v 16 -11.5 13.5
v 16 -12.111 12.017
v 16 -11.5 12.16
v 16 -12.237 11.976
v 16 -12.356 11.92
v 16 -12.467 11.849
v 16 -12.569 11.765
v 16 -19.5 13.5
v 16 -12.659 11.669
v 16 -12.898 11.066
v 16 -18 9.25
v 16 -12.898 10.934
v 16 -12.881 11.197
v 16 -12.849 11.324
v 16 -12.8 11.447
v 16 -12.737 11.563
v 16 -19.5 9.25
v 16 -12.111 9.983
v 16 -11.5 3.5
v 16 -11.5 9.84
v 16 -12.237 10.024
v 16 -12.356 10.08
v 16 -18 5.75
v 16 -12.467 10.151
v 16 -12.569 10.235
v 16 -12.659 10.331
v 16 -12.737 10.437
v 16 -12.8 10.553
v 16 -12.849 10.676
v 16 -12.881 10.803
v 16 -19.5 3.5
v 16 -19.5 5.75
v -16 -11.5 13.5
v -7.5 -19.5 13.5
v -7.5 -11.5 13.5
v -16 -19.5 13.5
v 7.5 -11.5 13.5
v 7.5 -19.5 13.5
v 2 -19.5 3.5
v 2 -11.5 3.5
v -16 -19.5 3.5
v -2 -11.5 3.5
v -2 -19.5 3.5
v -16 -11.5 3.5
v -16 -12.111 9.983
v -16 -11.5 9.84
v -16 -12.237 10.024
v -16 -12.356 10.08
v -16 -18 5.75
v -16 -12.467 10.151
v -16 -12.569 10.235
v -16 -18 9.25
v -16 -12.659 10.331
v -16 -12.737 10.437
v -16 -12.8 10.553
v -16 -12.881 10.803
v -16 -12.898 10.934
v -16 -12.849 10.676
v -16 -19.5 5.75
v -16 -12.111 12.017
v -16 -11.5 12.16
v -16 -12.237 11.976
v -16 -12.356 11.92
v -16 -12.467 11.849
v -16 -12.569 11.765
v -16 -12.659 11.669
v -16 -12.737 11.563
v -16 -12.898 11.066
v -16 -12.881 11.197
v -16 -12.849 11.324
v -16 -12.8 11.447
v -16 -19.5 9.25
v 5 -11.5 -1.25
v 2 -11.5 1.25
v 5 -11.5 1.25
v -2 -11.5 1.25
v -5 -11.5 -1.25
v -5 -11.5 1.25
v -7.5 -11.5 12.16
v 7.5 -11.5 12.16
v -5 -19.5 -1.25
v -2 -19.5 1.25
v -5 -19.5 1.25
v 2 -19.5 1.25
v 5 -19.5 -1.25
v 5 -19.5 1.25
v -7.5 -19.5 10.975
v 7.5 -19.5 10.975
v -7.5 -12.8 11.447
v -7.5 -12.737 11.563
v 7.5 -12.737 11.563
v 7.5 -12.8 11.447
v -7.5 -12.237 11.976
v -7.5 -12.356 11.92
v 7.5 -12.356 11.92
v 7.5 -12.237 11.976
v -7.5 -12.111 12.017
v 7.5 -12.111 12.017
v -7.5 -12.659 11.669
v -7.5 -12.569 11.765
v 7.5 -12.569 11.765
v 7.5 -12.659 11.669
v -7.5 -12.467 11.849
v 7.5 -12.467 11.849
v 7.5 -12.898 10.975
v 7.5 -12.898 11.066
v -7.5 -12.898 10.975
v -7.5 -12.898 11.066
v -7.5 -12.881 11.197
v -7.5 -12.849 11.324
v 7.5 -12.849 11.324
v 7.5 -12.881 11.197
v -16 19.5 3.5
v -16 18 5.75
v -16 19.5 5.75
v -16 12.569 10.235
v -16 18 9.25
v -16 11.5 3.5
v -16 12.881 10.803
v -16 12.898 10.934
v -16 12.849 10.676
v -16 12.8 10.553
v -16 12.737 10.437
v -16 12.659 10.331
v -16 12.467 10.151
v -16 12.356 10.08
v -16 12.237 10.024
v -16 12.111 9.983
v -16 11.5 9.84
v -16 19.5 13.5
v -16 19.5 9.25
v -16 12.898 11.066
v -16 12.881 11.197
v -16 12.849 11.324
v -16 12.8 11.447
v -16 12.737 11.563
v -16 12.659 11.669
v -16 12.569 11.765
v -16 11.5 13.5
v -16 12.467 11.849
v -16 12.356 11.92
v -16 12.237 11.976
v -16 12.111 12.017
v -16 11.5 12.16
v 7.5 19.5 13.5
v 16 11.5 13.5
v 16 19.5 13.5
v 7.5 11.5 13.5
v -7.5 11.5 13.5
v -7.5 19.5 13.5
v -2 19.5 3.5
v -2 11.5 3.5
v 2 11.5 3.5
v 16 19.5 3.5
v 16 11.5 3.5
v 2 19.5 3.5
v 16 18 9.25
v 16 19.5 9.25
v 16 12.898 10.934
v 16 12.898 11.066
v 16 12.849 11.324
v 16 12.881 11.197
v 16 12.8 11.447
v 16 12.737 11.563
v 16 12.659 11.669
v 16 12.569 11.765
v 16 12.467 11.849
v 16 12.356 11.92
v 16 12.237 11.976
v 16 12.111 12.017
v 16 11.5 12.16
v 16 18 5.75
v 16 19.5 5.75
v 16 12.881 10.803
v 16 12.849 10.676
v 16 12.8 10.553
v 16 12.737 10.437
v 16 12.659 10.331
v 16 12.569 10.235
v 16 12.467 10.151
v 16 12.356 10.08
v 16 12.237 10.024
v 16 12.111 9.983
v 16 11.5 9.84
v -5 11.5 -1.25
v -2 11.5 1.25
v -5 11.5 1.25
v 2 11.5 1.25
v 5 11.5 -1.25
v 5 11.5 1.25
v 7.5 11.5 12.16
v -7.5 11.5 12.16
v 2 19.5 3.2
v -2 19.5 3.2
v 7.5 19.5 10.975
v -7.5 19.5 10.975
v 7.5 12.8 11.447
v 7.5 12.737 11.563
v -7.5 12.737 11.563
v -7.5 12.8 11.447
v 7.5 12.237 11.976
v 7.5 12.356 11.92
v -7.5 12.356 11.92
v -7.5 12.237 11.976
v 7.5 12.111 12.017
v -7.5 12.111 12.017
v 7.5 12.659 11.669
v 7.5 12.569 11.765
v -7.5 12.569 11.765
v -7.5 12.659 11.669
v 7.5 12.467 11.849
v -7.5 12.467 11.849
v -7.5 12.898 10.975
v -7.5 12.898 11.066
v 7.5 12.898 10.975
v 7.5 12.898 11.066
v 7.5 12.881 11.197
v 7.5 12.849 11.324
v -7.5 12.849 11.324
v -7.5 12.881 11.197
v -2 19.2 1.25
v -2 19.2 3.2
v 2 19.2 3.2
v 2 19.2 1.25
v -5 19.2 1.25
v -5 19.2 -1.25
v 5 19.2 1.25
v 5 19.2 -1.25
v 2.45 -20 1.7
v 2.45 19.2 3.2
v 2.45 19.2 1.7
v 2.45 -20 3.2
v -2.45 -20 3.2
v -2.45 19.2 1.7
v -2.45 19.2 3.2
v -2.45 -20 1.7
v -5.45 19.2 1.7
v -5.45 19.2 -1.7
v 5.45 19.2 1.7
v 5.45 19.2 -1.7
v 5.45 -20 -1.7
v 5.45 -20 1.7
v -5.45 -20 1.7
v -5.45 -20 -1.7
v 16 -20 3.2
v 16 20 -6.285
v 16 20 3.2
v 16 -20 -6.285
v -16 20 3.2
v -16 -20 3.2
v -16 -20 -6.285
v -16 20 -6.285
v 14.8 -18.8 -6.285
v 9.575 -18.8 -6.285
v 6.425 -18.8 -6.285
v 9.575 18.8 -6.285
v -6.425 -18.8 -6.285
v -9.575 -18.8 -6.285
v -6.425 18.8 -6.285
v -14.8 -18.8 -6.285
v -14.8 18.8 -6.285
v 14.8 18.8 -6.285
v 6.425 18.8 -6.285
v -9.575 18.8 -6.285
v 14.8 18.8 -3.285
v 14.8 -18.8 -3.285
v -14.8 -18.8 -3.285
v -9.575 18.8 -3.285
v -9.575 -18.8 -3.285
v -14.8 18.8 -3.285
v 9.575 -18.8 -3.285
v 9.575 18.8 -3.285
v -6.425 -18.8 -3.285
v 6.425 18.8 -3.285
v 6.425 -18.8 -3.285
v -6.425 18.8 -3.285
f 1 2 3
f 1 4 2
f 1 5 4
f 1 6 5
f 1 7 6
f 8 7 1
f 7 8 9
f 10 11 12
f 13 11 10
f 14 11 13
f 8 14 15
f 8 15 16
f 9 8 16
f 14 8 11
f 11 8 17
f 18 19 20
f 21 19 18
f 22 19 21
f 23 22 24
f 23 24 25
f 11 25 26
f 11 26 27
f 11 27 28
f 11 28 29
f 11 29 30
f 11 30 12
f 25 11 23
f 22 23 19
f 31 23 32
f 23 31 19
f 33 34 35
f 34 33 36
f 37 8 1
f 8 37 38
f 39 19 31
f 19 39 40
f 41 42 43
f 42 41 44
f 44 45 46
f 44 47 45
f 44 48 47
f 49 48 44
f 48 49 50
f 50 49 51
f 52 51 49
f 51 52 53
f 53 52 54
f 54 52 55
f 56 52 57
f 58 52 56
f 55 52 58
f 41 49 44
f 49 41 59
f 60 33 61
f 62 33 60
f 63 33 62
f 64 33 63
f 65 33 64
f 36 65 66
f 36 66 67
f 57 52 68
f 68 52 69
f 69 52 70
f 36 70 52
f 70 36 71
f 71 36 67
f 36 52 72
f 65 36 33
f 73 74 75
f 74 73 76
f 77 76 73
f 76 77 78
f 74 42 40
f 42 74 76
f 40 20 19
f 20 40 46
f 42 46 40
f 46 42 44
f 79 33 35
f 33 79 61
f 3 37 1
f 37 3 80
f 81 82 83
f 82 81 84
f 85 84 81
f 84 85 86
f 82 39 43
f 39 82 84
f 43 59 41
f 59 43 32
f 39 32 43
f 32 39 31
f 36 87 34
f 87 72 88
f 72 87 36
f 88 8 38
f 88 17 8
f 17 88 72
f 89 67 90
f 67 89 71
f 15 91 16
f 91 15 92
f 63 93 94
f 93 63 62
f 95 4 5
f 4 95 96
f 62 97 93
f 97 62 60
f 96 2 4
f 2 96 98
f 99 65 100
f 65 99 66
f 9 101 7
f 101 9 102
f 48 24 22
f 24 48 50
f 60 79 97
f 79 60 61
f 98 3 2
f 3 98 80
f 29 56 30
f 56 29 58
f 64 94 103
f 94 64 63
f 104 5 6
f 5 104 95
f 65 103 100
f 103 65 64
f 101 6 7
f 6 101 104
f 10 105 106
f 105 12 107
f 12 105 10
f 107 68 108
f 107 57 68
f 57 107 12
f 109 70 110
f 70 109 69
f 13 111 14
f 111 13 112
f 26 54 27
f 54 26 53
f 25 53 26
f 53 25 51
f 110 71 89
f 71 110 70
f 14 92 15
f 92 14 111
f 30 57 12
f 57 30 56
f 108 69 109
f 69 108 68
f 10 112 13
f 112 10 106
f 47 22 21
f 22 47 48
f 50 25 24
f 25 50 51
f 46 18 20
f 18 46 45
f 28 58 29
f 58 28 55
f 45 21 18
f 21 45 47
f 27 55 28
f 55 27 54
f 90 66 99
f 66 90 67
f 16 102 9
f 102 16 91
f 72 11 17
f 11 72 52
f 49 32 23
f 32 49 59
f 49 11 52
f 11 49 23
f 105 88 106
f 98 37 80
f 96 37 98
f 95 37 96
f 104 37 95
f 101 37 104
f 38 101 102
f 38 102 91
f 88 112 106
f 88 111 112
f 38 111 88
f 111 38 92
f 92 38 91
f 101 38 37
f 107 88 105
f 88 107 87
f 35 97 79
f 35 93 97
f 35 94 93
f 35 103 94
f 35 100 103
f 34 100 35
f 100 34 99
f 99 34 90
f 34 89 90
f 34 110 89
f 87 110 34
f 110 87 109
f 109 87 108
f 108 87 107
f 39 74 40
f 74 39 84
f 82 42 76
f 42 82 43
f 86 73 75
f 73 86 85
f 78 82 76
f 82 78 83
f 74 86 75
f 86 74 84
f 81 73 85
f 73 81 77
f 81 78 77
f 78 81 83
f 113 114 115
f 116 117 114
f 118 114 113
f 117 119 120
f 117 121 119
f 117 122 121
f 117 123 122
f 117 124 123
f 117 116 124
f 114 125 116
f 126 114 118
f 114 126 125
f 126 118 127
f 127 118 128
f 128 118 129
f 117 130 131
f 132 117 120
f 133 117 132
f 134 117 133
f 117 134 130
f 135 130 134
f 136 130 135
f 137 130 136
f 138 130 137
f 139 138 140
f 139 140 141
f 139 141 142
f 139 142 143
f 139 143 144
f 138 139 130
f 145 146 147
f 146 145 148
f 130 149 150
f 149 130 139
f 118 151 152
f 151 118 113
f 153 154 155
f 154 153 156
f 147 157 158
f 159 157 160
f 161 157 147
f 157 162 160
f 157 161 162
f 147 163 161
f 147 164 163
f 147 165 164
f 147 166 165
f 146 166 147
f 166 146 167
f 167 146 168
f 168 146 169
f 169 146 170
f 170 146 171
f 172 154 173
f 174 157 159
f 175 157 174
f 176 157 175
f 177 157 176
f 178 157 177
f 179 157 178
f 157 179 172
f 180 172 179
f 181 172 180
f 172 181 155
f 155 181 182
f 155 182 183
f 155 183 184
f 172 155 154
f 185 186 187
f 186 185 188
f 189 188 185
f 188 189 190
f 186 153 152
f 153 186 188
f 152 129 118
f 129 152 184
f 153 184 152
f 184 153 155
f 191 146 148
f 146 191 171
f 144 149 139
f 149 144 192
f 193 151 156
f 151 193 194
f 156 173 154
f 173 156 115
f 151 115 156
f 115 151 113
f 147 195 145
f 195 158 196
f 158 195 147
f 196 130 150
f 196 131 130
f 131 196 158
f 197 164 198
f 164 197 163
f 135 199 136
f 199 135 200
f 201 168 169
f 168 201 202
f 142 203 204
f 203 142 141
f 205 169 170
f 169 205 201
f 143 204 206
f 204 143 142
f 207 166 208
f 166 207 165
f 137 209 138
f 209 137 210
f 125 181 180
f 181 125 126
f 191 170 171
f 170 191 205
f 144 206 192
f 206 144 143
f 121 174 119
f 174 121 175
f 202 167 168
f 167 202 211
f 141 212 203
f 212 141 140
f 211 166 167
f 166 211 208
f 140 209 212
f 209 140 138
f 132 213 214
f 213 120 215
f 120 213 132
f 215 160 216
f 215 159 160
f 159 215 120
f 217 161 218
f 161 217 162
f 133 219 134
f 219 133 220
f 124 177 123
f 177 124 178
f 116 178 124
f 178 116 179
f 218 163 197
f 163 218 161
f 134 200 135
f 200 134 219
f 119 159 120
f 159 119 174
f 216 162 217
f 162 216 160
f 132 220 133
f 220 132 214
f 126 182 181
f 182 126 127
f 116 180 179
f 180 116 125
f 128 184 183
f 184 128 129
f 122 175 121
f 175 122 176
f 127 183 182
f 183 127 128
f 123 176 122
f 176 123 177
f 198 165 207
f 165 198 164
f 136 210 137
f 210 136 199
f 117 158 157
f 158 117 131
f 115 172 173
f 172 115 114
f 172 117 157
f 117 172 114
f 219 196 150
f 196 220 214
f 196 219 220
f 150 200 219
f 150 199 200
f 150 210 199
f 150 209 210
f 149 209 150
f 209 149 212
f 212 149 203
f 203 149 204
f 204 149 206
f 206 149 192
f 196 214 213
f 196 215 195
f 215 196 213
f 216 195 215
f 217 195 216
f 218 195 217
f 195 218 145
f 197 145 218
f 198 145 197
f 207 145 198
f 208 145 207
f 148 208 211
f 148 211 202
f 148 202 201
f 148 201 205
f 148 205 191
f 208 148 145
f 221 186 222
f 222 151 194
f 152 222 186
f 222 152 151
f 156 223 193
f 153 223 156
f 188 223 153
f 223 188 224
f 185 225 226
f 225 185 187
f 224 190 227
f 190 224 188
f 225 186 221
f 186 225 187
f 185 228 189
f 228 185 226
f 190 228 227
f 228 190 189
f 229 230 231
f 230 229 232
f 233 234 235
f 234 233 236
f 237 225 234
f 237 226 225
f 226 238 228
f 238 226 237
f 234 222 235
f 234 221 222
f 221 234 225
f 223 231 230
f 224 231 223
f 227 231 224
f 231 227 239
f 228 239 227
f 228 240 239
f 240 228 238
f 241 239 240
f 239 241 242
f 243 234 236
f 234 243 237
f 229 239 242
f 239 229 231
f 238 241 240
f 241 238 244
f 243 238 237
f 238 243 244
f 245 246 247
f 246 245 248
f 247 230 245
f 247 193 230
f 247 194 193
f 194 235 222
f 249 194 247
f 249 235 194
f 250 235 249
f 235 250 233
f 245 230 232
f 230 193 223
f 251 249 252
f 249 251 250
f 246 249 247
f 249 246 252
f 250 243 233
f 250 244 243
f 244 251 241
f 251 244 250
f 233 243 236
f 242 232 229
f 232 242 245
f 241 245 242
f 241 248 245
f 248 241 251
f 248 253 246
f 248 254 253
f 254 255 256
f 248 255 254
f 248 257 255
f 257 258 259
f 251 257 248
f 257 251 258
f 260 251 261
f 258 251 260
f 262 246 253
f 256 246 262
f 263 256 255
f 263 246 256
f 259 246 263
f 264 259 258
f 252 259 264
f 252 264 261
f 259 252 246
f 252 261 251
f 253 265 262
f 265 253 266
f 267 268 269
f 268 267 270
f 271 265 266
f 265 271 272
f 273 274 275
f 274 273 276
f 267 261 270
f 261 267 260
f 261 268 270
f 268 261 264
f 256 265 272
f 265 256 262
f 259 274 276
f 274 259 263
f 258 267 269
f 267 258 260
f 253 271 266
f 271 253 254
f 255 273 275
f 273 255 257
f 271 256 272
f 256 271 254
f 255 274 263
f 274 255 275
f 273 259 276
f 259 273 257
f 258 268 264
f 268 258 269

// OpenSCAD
/*
 * Component Holder.scad
 *
 *
 * NOTES:
 *
 * There are two different parts, the Track (with LEGO compatible fittings
 * on the bottom) and the Jaws which slide in the groove of the track and 
 * are held tight using a rubber band.
 *
 * You will need to print one track and two jaws.
 *
 * The track should be printed standing on end, and the jaws should be 
 * printed face down (with the curved PCB groove) on the bed.
 *
 * INSTRUCTIONS:
 *
 * 1. In the RENDER section set beautyRender to 1 and the rest to 0
 * 
 * 2. In SETTINGS set componentX and componentY to the size of the 
 *    PCB of the component you will be using.
 *
 * 3. In SETTINGS adjust brickX and brickY to be sized appropriately 
 *    to fit the component you added in the first step.
 * 
 * 4. If needed, change slotWidth to a number above 0 to accommodate 
 *    elements that may need clearance on the jaws.
 * 
 * 5. In the RENDER section set only trackRender to 1 and then export
 *    that, and then do the same for jawRender.
 *
 * 
 * Pete Prodoehl <pete@browndoggadgets.com>
 *
 */


/* --- SETTIINGS ---------------------------------------------------------------------------- */

// set the size of the component
componentX = 34;
componentY = 26;

// adjust for the size you need to hold the component
brickX = 4;
brickY = 5;

// do not change these values
trackWidth  = brickX * 8;   // do not change
trackLength = brickY * 8;   // do not change
trackHeight = 5.5;          // do not change
trackMidX   = 4;            // do not change
trackMidZ   = 5;            // do not change
trackBotX   = 10;           // do not change
trackBotZ   = 2.5;          // do not change

// adjust if desired to change the width of the jaws
jawWidth = trackWidth;

// adjusting only affects preview of jaws if needed
jawPreviewSpace = 4.5;  // default to 4.5

// add a slot in the jaw for some components if needed
slotWidth = 15; // set to 0 for no slot

$fn=50;


/* --- RENDER ------------------------------------------------------------------------------- */


// toggle these to affect the preview and rendering
trackRender  = 0;
jawRender    = 0;
beautyRender = 1;



// render commands
if (jawRender) {
	translate([0,0,0/2]) jawPart();
}
if (trackRender) {
	translate([0,0,0/2]) trackPart();
}
if (beautyRender) {
	translate([0,-trackLength/2+jawPreviewSpace,0]) rotate([0,0,0])   color("#0066FF") jawPart();
	translate([0,+trackLength/2-jawPreviewSpace,0]) rotate([0,0,180]) color("#0066FF") jawPart();
	translate([0,0,0]) color("#99AA00") trackPart();
	%translate([0,0,11]) cube([componentX,componentY,1.6], center=true); // component size here
}



/* --- MODULES ------------------------------------------------------------------------------ */

// jawPart is the jaws which hold the component...
//
module jawPart() {

    difference() {
        
        // top of jaw with PCB and rubber band slot cutouts
        translate([0,0,8.5])
            cube([jawWidth,8,10], center=true);
            
        // PCB slot
        hull() {
        
            translate([0,4.75,11])
                rotate([0,90,0])
                    cylinder(d=2.6, h=jawWidth+0.01, center=true);

            translate([0,3.65,11])
                rotate([0,90,0])
                    cylinder(d=2.1, h=jawWidth+0.01, center=true);                
                
        }
            
        // rubber band slot
        translate([0,-4.5,7.5])
            cube([jawWidth+0.01,4,3.5], center=true);
            
        // slot if included
        translate([0,0,13.85])
            cube([slotWidth,10,5.75], center=true);
      
    }

	// inverted T at the bottom of the jaw
    translate([0,0,0])
        guidePart();

}

/* ------------------------------------------------------------------------------------------ */

// trackPart is the basic track sized as specified
// with the guideSlot cut out from it...
//
module trackPart() {
    
    difference() {

        translate([0,0,-trackHeight/2+3.2])
            cube([trackWidth,trackLength,trackHeight], center=true);
            
        translate([0,-0.8,0])
           guideSlot();

    }
    
    // LEGO compatible bottom portion
    translate([0,0,-4.285])
        Lego_Maker(brickY, brickX);
	
} // end trackPart

/* ------------------------------------------------------------------------------------------ */

// guidePart is the inverted T at the bottom of the jaw that fits into the slot/groove
// in the trackPart which gets created by cutting out the guideSlot...
//
module guidePart() {

    variance = 0;
    trackLength = 8; 

    // middle
    translate([0,0,3])
        color("#00FF33")
            cube([trackMidX+variance,trackLength,trackMidZ+variance], center=true);
    
    // bottom
    translate([0,0,0])
        color("#33AA66")
            cube([trackBotX+variance,trackLength,trackBotZ+variance], center=true);
        
}  // end guidePart

/* ------------------------------------------------------------------------------------------ */

// guideSlot is the cutout part from the trackPart which creates the slot/groove 
// that the guidePart fits into and slides in...
//
module guideSlot() {
    
    variance = 0.9;
    
    // middle
    translate([0,0,3])
        color("#996600")
            cube([trackMidX+variance,trackLength,trackMidZ+variance], center=true);
            
    // bottom
    translate([0,0,0])
        color("#999900")
            cube([trackBotX+variance,trackLength,trackBotZ+variance], center=true);
        
}  // end guideSlot

/* ------------------------------------------------------------------------------------------ */

// Lego_Maker creates the modified LEGO brick-like part at the bottom of the holder...
//
module Lego_Maker(width, length) {

	unit_height   = 4;    // height of main brick
	unit_width    = 8;    // width of one LEGO Unit
    wall_width_x2 = 3.15; // double wall width
    
    difference() {
    
        translate([0,0,0])
            cube([length*unit_width, width*unit_width, unit_height], center=true);
    
        translate([0,0,-1])
            cube([length*unit_width-2.4, width*unit_width-2.4, unit_height], center=true);

    }
    
    translate([trackWidth/2-unit_width,0,0])
        cube([wall_width_x2, width*unit_width, unit_height], center=true);
        
    translate([-trackWidth/2+unit_width,0,0])
        cube([wall_width_x2, width*unit_width, unit_height], center=true);

}  // end Lego_Maker

/* ------------------------------------------------------------------------------------------ */
